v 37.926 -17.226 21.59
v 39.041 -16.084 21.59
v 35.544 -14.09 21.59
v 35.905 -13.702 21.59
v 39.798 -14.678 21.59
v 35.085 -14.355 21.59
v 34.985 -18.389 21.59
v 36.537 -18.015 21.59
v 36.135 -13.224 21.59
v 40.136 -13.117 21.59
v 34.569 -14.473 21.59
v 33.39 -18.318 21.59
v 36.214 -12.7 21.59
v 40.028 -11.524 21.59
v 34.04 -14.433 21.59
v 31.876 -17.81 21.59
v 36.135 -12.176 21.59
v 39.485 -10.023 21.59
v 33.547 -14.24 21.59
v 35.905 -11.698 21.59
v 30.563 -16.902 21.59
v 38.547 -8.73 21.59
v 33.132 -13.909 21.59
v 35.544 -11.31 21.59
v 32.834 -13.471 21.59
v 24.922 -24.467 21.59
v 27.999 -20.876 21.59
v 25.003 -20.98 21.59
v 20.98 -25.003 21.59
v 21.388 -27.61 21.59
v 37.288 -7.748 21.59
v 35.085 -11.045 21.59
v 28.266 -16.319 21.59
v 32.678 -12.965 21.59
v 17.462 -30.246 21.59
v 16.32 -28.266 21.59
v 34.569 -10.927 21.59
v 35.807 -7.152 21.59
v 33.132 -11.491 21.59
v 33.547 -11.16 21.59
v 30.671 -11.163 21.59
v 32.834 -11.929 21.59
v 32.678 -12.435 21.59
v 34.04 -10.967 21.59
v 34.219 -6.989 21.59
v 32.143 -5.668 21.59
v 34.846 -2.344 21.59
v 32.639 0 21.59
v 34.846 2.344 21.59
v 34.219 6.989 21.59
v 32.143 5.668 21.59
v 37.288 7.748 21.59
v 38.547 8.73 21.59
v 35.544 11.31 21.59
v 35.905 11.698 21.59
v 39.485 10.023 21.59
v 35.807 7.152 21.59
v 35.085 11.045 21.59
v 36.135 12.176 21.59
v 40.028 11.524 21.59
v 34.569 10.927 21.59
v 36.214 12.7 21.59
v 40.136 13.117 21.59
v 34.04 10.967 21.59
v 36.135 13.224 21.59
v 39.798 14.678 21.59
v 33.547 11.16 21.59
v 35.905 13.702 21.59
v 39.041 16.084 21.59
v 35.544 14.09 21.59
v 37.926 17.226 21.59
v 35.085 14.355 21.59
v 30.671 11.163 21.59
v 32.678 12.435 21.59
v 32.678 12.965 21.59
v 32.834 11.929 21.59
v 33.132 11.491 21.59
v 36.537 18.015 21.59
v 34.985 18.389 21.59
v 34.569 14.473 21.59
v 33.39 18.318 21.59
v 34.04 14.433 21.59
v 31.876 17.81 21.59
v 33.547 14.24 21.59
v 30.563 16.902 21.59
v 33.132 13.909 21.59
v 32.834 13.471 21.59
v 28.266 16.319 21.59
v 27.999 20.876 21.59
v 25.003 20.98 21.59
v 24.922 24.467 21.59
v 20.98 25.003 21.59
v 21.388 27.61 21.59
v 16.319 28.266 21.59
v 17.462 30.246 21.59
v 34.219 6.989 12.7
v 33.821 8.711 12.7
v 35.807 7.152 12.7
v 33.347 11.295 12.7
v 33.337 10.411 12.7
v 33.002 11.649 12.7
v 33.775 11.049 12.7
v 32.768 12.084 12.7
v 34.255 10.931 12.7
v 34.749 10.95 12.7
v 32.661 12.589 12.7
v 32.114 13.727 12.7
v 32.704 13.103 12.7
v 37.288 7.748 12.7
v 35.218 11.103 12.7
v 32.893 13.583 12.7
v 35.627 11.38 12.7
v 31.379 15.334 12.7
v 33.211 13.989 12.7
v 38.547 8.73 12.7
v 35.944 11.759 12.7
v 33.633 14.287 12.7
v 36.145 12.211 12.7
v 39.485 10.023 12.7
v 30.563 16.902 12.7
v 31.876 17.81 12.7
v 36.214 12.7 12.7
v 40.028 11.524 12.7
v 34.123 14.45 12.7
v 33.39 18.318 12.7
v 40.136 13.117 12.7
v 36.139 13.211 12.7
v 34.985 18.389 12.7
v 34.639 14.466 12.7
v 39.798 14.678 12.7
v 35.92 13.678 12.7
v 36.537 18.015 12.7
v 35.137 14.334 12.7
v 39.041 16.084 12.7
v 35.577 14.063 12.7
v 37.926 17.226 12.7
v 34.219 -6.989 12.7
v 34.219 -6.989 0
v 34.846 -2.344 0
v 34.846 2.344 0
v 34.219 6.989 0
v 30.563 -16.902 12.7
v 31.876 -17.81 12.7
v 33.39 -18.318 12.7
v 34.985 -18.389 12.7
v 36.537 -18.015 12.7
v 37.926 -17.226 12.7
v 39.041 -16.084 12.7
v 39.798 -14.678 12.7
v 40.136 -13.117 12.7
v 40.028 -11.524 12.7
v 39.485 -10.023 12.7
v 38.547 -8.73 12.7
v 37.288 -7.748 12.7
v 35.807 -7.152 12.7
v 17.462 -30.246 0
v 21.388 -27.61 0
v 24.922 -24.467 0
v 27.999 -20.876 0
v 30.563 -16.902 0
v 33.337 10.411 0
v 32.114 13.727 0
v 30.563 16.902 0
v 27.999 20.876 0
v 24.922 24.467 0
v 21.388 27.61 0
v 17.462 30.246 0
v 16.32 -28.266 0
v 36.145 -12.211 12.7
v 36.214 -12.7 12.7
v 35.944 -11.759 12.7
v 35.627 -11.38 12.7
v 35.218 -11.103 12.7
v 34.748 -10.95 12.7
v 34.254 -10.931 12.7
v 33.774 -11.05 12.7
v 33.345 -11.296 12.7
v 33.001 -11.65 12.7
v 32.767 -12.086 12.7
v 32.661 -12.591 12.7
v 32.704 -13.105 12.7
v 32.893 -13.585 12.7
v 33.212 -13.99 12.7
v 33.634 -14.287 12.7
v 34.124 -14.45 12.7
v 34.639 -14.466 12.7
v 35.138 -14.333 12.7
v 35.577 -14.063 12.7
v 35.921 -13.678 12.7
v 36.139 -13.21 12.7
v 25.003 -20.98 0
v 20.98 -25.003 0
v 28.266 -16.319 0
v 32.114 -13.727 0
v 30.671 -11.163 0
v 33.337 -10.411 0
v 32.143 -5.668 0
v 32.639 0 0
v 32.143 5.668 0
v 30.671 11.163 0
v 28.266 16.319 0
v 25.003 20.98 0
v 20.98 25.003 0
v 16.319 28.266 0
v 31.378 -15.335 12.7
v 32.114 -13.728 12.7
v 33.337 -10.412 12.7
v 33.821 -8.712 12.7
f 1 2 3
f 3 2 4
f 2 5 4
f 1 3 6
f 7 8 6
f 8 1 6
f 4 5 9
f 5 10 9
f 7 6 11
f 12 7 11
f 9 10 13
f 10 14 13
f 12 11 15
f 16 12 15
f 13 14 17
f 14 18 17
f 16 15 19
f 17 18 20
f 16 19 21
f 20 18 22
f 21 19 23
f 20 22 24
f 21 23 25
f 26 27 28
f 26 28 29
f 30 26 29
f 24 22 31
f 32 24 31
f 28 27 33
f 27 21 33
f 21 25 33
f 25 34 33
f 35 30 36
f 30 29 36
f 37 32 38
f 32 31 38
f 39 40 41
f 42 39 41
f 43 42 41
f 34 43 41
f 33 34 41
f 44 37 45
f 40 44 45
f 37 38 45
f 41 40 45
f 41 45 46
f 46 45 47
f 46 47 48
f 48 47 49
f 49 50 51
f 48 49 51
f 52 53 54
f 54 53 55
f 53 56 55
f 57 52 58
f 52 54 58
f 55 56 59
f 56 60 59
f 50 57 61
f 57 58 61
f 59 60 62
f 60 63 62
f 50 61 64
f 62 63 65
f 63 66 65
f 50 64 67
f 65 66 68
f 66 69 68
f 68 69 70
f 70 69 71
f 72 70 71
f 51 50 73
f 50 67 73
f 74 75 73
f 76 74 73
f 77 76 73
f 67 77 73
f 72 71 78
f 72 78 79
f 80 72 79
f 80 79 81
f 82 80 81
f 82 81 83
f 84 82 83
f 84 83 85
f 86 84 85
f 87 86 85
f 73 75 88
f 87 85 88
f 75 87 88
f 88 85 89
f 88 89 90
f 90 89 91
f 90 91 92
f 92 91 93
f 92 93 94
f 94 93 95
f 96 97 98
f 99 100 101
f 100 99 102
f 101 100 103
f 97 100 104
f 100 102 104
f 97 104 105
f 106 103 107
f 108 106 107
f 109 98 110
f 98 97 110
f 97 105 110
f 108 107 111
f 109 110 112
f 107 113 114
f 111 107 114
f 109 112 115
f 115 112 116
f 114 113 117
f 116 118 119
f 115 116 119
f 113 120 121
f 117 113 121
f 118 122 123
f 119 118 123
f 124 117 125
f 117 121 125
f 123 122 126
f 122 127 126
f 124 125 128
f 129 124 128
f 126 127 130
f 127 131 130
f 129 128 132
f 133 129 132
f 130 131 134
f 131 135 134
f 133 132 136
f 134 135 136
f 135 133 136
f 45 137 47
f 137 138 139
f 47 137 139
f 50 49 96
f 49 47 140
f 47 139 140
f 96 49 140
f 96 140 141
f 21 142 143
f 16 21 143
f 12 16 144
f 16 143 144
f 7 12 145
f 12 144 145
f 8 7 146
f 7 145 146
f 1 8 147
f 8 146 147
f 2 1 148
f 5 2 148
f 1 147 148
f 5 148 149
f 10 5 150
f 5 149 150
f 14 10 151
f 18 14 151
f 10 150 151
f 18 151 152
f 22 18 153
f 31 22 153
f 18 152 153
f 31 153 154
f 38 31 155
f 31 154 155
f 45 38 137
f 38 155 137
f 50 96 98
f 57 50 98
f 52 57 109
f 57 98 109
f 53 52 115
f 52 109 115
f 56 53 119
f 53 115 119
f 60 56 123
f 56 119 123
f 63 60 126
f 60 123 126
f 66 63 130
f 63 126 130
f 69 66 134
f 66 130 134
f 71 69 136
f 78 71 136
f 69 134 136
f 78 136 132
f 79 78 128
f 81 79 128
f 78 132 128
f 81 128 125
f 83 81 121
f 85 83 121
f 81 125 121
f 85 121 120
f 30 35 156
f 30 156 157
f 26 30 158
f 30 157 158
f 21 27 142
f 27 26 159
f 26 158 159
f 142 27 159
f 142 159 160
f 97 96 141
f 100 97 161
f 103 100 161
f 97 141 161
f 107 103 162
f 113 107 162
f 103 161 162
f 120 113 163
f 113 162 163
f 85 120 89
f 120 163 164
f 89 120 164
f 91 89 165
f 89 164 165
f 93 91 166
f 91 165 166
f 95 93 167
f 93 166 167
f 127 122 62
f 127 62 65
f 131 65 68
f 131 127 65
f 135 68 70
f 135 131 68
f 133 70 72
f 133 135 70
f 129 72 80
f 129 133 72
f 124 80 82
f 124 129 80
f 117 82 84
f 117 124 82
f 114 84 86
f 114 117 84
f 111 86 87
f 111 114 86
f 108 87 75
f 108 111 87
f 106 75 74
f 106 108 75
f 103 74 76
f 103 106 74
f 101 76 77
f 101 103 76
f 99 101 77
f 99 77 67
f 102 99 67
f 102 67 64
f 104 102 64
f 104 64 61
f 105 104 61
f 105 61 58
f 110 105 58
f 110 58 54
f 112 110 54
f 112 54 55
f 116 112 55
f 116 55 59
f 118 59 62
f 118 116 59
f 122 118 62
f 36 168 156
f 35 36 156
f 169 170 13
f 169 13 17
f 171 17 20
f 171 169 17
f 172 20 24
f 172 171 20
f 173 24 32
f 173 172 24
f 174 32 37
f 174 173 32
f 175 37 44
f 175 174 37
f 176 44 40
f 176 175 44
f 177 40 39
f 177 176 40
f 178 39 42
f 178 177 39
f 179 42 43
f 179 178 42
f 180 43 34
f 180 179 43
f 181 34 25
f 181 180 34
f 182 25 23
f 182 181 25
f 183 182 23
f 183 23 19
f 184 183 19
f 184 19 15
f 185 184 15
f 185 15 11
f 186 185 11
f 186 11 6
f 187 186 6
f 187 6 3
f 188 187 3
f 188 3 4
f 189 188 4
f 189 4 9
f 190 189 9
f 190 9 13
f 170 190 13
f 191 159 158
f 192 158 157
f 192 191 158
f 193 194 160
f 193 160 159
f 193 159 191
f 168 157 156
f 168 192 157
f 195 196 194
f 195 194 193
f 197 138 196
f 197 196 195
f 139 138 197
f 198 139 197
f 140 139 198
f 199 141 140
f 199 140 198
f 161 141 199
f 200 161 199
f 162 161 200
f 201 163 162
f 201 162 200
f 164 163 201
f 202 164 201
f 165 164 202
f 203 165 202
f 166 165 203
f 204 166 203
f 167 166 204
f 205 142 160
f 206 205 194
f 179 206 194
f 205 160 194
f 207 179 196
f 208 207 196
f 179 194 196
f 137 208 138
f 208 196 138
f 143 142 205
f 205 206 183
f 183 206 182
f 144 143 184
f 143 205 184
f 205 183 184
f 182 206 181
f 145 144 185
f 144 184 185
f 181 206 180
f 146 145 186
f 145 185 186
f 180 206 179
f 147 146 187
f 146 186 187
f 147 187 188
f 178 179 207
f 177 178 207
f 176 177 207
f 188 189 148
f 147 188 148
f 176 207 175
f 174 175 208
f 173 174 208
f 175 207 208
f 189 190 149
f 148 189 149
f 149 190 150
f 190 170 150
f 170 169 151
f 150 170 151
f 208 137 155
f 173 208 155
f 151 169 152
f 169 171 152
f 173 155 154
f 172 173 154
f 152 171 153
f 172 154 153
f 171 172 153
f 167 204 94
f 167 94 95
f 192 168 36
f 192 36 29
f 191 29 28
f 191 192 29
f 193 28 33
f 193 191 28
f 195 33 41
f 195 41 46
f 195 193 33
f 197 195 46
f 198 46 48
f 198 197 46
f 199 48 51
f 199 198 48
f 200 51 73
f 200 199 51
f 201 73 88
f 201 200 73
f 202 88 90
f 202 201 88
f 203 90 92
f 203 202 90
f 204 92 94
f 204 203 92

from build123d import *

# Parameters (mm, degrees)
SKETCH_R     = 1.778
PAD_DEPTH    = 21.59
POCKET_DEPTH = 12.7


with BuildPart() as part:
    # Sketch → Pad (new body)
    with BuildSketch(Plane.XY):
        with BuildLine():
            ThreePointArc((16.3195, -28.266203), (32.639, 0), (16.3195, 28.266203))
            Line((16.3195, 28.266203), (17.4625, 30.245937))
            ThreePointArc((30.56252, 16.902308), (24.922154, 24.467159), (17.4625, 30.245937))
            ThreePointArc((34.218529, 6.989129), (39.797707, 14.677509), (30.56252, 16.902308))
            ThreePointArc((34.218529, -6.989129), (34.925, 0), (34.218529, 6.989129))
            ThreePointArc((30.56252, -16.902308), (39.797707, -14.677509), (34.218529, -6.989129))
            ThreePointArc((17.4625, -30.245937), (24.922154, -24.467159), (30.56252, -16.902308))
            Line((16.3195, -28.266203), (17.4625, -30.245937))
        make_face()
        with Locations((34.43574, 12.7)):
            Circle(SKETCH_R, mode=Mode.SUBTRACT)
        with Locations((34.43574, -12.7)):
            Circle(SKETCH_R, mode=Mode.SUBTRACT)
    extrude(amount=PAD_DEPTH)

    # Sketch001 → Pocket (cut)
    with BuildSketch(Plane.XY):
        with BuildLine():
            ThreePointArc((34.218529, 6.989129), (39.797707, 14.677509), (30.56252, 16.902308))
            ThreePointArc((34.218529, 6.989129), (32.767573, 12.084775), (30.56252, 16.902308))
        make_face()
        with BuildLine():
            ThreePointArc((30.56252, -16.902308), (39.797707, -14.677509), (34.218529, -6.989129))
            ThreePointArc((30.56252, -16.902308), (32.767573, -12.084775), (34.218529, -6.989129))
        make_face()
    extrude(amount=POCKET_DEPTH, mode=Mode.SUBTRACT)


solid = part.part
